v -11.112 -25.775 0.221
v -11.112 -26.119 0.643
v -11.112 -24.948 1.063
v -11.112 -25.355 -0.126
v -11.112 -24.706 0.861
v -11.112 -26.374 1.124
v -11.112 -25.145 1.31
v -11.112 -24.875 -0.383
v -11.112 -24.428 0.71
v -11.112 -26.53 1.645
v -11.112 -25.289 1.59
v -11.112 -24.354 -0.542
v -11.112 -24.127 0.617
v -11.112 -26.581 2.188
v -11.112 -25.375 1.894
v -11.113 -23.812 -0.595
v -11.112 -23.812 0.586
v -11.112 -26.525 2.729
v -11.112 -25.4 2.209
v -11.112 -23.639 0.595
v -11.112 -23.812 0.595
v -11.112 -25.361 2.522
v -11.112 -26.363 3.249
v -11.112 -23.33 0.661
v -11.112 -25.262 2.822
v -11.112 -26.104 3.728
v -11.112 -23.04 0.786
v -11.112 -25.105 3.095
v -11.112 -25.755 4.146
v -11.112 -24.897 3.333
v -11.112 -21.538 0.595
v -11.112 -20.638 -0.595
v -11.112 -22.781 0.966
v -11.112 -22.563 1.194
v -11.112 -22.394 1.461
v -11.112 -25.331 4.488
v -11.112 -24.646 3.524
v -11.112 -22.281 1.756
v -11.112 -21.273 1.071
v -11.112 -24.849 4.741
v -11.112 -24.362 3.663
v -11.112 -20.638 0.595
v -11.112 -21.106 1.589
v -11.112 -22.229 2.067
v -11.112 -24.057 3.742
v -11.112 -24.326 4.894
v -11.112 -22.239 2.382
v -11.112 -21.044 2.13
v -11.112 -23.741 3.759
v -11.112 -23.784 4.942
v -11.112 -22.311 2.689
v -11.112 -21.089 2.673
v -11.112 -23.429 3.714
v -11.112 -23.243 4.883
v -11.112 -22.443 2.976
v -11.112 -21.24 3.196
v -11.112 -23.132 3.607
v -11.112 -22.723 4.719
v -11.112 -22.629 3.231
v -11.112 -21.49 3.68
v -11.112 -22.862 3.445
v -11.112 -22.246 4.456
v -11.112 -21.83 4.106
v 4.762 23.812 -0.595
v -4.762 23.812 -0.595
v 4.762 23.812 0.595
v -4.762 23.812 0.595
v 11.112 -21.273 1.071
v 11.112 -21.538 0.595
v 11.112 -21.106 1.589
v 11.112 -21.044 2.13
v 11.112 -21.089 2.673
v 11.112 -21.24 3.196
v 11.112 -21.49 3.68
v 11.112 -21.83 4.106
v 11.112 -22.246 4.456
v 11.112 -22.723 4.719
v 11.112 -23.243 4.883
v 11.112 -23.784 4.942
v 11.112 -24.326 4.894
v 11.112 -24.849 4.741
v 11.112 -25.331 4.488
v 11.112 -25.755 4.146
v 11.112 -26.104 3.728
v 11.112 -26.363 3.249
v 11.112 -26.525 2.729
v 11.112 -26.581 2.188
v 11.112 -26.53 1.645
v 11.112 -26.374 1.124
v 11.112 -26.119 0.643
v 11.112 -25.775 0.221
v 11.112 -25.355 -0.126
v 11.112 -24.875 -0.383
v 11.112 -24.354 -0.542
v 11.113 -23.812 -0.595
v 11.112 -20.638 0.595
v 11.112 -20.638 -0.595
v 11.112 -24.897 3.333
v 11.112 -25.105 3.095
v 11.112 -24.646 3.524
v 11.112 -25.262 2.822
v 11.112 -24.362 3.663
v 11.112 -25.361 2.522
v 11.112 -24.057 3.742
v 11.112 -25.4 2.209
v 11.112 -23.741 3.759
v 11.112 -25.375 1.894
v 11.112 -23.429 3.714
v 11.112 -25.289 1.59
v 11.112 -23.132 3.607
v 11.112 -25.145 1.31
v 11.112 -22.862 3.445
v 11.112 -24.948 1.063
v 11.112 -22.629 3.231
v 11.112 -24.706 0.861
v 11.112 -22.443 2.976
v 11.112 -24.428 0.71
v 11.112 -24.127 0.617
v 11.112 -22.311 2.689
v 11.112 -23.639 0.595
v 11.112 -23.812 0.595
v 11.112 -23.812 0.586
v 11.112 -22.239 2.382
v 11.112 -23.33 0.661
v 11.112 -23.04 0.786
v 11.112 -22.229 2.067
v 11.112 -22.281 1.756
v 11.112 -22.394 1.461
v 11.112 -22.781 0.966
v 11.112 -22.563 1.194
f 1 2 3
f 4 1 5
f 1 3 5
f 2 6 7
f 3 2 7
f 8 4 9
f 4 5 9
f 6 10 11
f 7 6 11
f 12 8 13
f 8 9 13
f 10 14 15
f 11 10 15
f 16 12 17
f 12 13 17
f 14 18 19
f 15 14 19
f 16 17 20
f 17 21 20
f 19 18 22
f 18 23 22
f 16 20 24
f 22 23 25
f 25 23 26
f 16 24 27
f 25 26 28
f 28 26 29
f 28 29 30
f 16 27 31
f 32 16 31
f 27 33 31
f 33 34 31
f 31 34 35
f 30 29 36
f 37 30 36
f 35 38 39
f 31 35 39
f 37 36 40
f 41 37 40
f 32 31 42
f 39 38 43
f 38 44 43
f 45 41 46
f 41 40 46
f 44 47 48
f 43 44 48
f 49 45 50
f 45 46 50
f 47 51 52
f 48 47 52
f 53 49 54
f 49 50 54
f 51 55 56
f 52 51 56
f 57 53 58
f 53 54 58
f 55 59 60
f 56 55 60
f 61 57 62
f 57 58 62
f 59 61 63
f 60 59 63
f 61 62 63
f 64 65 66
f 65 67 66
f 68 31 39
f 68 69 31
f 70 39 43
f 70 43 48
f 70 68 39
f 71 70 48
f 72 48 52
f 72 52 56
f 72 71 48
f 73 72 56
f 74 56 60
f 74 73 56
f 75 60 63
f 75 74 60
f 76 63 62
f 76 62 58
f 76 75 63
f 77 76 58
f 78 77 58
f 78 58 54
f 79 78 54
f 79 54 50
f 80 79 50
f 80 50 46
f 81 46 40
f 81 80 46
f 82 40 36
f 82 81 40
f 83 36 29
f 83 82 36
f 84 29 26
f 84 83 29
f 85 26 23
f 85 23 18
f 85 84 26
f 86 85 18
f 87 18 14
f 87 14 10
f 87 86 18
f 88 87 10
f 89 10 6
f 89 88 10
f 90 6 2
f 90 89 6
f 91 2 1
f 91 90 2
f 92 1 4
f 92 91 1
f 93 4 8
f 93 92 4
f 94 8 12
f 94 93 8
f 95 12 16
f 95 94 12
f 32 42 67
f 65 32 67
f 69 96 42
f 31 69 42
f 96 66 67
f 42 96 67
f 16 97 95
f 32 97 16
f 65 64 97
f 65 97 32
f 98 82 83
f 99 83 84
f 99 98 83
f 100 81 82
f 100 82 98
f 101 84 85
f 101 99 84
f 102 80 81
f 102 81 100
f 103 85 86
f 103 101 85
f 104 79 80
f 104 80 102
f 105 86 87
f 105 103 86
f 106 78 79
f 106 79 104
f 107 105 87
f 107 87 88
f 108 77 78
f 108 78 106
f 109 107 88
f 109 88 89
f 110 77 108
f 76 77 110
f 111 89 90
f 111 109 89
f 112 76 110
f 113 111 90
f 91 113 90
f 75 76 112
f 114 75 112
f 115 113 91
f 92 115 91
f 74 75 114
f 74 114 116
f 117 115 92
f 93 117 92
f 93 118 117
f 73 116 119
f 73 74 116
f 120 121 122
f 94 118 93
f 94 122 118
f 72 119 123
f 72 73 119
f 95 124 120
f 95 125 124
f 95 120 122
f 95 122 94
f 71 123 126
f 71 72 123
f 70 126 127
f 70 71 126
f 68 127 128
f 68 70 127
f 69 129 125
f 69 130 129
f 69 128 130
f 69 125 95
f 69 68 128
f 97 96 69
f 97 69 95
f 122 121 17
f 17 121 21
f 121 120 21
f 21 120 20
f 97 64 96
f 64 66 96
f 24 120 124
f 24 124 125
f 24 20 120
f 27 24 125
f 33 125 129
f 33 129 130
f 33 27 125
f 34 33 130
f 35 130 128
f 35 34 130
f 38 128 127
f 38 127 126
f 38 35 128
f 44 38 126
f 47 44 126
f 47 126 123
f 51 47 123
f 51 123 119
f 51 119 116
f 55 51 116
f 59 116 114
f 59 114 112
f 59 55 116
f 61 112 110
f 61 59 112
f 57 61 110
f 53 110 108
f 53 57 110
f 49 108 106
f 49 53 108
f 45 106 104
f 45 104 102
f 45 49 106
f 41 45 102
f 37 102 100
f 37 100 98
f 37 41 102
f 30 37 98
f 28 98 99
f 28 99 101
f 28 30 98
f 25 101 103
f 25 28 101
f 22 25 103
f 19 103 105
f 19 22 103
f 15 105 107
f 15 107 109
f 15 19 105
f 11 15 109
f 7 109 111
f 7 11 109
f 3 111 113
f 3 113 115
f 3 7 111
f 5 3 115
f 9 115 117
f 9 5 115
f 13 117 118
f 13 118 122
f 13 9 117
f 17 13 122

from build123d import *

# Parameters (mm, degrees)
BOSS_EXTRUDE1_DEPTH = 0.5953125
SKETCH2_R           = 2.7686
SKETCH2_R_2         = 1.5875
BOSS_EXTRUDE2_DEPTH = 11.1125


with BuildPart() as part:
    # Sketch1 → Boss-Extrude1 (new, symmetric)
    with BuildSketch(Plane.XY):
        Polygon((-11.1125, -20.6375), (-4.7625, 23.8125), (4.7625, 23.8125), (11.1125, -20.6375), (11.1125, -23.8125), (-11.1125, -23.8125), align=None)
    extrude(amount=BOSS_EXTRUDE1_DEPTH, both=True)

    # Sketch2 → Boss-Extrude2 (add, symmetric)
    with BuildSketch(Plane(origin=(0, 0, 0), x_dir=(0, 0, -1), z_dir=(1, 0, 0))):
        with Locations((-2.1732875, -23.8125)):
            Circle(SKETCH2_R)
        with Locations((-2.1732875, -23.8125)):
            Circle(SKETCH2_R_2, mode=Mode.SUBTRACT)
    extrude(amount=BOSS_EXTRUDE2_DEPTH, both=True)


solid = part.part
